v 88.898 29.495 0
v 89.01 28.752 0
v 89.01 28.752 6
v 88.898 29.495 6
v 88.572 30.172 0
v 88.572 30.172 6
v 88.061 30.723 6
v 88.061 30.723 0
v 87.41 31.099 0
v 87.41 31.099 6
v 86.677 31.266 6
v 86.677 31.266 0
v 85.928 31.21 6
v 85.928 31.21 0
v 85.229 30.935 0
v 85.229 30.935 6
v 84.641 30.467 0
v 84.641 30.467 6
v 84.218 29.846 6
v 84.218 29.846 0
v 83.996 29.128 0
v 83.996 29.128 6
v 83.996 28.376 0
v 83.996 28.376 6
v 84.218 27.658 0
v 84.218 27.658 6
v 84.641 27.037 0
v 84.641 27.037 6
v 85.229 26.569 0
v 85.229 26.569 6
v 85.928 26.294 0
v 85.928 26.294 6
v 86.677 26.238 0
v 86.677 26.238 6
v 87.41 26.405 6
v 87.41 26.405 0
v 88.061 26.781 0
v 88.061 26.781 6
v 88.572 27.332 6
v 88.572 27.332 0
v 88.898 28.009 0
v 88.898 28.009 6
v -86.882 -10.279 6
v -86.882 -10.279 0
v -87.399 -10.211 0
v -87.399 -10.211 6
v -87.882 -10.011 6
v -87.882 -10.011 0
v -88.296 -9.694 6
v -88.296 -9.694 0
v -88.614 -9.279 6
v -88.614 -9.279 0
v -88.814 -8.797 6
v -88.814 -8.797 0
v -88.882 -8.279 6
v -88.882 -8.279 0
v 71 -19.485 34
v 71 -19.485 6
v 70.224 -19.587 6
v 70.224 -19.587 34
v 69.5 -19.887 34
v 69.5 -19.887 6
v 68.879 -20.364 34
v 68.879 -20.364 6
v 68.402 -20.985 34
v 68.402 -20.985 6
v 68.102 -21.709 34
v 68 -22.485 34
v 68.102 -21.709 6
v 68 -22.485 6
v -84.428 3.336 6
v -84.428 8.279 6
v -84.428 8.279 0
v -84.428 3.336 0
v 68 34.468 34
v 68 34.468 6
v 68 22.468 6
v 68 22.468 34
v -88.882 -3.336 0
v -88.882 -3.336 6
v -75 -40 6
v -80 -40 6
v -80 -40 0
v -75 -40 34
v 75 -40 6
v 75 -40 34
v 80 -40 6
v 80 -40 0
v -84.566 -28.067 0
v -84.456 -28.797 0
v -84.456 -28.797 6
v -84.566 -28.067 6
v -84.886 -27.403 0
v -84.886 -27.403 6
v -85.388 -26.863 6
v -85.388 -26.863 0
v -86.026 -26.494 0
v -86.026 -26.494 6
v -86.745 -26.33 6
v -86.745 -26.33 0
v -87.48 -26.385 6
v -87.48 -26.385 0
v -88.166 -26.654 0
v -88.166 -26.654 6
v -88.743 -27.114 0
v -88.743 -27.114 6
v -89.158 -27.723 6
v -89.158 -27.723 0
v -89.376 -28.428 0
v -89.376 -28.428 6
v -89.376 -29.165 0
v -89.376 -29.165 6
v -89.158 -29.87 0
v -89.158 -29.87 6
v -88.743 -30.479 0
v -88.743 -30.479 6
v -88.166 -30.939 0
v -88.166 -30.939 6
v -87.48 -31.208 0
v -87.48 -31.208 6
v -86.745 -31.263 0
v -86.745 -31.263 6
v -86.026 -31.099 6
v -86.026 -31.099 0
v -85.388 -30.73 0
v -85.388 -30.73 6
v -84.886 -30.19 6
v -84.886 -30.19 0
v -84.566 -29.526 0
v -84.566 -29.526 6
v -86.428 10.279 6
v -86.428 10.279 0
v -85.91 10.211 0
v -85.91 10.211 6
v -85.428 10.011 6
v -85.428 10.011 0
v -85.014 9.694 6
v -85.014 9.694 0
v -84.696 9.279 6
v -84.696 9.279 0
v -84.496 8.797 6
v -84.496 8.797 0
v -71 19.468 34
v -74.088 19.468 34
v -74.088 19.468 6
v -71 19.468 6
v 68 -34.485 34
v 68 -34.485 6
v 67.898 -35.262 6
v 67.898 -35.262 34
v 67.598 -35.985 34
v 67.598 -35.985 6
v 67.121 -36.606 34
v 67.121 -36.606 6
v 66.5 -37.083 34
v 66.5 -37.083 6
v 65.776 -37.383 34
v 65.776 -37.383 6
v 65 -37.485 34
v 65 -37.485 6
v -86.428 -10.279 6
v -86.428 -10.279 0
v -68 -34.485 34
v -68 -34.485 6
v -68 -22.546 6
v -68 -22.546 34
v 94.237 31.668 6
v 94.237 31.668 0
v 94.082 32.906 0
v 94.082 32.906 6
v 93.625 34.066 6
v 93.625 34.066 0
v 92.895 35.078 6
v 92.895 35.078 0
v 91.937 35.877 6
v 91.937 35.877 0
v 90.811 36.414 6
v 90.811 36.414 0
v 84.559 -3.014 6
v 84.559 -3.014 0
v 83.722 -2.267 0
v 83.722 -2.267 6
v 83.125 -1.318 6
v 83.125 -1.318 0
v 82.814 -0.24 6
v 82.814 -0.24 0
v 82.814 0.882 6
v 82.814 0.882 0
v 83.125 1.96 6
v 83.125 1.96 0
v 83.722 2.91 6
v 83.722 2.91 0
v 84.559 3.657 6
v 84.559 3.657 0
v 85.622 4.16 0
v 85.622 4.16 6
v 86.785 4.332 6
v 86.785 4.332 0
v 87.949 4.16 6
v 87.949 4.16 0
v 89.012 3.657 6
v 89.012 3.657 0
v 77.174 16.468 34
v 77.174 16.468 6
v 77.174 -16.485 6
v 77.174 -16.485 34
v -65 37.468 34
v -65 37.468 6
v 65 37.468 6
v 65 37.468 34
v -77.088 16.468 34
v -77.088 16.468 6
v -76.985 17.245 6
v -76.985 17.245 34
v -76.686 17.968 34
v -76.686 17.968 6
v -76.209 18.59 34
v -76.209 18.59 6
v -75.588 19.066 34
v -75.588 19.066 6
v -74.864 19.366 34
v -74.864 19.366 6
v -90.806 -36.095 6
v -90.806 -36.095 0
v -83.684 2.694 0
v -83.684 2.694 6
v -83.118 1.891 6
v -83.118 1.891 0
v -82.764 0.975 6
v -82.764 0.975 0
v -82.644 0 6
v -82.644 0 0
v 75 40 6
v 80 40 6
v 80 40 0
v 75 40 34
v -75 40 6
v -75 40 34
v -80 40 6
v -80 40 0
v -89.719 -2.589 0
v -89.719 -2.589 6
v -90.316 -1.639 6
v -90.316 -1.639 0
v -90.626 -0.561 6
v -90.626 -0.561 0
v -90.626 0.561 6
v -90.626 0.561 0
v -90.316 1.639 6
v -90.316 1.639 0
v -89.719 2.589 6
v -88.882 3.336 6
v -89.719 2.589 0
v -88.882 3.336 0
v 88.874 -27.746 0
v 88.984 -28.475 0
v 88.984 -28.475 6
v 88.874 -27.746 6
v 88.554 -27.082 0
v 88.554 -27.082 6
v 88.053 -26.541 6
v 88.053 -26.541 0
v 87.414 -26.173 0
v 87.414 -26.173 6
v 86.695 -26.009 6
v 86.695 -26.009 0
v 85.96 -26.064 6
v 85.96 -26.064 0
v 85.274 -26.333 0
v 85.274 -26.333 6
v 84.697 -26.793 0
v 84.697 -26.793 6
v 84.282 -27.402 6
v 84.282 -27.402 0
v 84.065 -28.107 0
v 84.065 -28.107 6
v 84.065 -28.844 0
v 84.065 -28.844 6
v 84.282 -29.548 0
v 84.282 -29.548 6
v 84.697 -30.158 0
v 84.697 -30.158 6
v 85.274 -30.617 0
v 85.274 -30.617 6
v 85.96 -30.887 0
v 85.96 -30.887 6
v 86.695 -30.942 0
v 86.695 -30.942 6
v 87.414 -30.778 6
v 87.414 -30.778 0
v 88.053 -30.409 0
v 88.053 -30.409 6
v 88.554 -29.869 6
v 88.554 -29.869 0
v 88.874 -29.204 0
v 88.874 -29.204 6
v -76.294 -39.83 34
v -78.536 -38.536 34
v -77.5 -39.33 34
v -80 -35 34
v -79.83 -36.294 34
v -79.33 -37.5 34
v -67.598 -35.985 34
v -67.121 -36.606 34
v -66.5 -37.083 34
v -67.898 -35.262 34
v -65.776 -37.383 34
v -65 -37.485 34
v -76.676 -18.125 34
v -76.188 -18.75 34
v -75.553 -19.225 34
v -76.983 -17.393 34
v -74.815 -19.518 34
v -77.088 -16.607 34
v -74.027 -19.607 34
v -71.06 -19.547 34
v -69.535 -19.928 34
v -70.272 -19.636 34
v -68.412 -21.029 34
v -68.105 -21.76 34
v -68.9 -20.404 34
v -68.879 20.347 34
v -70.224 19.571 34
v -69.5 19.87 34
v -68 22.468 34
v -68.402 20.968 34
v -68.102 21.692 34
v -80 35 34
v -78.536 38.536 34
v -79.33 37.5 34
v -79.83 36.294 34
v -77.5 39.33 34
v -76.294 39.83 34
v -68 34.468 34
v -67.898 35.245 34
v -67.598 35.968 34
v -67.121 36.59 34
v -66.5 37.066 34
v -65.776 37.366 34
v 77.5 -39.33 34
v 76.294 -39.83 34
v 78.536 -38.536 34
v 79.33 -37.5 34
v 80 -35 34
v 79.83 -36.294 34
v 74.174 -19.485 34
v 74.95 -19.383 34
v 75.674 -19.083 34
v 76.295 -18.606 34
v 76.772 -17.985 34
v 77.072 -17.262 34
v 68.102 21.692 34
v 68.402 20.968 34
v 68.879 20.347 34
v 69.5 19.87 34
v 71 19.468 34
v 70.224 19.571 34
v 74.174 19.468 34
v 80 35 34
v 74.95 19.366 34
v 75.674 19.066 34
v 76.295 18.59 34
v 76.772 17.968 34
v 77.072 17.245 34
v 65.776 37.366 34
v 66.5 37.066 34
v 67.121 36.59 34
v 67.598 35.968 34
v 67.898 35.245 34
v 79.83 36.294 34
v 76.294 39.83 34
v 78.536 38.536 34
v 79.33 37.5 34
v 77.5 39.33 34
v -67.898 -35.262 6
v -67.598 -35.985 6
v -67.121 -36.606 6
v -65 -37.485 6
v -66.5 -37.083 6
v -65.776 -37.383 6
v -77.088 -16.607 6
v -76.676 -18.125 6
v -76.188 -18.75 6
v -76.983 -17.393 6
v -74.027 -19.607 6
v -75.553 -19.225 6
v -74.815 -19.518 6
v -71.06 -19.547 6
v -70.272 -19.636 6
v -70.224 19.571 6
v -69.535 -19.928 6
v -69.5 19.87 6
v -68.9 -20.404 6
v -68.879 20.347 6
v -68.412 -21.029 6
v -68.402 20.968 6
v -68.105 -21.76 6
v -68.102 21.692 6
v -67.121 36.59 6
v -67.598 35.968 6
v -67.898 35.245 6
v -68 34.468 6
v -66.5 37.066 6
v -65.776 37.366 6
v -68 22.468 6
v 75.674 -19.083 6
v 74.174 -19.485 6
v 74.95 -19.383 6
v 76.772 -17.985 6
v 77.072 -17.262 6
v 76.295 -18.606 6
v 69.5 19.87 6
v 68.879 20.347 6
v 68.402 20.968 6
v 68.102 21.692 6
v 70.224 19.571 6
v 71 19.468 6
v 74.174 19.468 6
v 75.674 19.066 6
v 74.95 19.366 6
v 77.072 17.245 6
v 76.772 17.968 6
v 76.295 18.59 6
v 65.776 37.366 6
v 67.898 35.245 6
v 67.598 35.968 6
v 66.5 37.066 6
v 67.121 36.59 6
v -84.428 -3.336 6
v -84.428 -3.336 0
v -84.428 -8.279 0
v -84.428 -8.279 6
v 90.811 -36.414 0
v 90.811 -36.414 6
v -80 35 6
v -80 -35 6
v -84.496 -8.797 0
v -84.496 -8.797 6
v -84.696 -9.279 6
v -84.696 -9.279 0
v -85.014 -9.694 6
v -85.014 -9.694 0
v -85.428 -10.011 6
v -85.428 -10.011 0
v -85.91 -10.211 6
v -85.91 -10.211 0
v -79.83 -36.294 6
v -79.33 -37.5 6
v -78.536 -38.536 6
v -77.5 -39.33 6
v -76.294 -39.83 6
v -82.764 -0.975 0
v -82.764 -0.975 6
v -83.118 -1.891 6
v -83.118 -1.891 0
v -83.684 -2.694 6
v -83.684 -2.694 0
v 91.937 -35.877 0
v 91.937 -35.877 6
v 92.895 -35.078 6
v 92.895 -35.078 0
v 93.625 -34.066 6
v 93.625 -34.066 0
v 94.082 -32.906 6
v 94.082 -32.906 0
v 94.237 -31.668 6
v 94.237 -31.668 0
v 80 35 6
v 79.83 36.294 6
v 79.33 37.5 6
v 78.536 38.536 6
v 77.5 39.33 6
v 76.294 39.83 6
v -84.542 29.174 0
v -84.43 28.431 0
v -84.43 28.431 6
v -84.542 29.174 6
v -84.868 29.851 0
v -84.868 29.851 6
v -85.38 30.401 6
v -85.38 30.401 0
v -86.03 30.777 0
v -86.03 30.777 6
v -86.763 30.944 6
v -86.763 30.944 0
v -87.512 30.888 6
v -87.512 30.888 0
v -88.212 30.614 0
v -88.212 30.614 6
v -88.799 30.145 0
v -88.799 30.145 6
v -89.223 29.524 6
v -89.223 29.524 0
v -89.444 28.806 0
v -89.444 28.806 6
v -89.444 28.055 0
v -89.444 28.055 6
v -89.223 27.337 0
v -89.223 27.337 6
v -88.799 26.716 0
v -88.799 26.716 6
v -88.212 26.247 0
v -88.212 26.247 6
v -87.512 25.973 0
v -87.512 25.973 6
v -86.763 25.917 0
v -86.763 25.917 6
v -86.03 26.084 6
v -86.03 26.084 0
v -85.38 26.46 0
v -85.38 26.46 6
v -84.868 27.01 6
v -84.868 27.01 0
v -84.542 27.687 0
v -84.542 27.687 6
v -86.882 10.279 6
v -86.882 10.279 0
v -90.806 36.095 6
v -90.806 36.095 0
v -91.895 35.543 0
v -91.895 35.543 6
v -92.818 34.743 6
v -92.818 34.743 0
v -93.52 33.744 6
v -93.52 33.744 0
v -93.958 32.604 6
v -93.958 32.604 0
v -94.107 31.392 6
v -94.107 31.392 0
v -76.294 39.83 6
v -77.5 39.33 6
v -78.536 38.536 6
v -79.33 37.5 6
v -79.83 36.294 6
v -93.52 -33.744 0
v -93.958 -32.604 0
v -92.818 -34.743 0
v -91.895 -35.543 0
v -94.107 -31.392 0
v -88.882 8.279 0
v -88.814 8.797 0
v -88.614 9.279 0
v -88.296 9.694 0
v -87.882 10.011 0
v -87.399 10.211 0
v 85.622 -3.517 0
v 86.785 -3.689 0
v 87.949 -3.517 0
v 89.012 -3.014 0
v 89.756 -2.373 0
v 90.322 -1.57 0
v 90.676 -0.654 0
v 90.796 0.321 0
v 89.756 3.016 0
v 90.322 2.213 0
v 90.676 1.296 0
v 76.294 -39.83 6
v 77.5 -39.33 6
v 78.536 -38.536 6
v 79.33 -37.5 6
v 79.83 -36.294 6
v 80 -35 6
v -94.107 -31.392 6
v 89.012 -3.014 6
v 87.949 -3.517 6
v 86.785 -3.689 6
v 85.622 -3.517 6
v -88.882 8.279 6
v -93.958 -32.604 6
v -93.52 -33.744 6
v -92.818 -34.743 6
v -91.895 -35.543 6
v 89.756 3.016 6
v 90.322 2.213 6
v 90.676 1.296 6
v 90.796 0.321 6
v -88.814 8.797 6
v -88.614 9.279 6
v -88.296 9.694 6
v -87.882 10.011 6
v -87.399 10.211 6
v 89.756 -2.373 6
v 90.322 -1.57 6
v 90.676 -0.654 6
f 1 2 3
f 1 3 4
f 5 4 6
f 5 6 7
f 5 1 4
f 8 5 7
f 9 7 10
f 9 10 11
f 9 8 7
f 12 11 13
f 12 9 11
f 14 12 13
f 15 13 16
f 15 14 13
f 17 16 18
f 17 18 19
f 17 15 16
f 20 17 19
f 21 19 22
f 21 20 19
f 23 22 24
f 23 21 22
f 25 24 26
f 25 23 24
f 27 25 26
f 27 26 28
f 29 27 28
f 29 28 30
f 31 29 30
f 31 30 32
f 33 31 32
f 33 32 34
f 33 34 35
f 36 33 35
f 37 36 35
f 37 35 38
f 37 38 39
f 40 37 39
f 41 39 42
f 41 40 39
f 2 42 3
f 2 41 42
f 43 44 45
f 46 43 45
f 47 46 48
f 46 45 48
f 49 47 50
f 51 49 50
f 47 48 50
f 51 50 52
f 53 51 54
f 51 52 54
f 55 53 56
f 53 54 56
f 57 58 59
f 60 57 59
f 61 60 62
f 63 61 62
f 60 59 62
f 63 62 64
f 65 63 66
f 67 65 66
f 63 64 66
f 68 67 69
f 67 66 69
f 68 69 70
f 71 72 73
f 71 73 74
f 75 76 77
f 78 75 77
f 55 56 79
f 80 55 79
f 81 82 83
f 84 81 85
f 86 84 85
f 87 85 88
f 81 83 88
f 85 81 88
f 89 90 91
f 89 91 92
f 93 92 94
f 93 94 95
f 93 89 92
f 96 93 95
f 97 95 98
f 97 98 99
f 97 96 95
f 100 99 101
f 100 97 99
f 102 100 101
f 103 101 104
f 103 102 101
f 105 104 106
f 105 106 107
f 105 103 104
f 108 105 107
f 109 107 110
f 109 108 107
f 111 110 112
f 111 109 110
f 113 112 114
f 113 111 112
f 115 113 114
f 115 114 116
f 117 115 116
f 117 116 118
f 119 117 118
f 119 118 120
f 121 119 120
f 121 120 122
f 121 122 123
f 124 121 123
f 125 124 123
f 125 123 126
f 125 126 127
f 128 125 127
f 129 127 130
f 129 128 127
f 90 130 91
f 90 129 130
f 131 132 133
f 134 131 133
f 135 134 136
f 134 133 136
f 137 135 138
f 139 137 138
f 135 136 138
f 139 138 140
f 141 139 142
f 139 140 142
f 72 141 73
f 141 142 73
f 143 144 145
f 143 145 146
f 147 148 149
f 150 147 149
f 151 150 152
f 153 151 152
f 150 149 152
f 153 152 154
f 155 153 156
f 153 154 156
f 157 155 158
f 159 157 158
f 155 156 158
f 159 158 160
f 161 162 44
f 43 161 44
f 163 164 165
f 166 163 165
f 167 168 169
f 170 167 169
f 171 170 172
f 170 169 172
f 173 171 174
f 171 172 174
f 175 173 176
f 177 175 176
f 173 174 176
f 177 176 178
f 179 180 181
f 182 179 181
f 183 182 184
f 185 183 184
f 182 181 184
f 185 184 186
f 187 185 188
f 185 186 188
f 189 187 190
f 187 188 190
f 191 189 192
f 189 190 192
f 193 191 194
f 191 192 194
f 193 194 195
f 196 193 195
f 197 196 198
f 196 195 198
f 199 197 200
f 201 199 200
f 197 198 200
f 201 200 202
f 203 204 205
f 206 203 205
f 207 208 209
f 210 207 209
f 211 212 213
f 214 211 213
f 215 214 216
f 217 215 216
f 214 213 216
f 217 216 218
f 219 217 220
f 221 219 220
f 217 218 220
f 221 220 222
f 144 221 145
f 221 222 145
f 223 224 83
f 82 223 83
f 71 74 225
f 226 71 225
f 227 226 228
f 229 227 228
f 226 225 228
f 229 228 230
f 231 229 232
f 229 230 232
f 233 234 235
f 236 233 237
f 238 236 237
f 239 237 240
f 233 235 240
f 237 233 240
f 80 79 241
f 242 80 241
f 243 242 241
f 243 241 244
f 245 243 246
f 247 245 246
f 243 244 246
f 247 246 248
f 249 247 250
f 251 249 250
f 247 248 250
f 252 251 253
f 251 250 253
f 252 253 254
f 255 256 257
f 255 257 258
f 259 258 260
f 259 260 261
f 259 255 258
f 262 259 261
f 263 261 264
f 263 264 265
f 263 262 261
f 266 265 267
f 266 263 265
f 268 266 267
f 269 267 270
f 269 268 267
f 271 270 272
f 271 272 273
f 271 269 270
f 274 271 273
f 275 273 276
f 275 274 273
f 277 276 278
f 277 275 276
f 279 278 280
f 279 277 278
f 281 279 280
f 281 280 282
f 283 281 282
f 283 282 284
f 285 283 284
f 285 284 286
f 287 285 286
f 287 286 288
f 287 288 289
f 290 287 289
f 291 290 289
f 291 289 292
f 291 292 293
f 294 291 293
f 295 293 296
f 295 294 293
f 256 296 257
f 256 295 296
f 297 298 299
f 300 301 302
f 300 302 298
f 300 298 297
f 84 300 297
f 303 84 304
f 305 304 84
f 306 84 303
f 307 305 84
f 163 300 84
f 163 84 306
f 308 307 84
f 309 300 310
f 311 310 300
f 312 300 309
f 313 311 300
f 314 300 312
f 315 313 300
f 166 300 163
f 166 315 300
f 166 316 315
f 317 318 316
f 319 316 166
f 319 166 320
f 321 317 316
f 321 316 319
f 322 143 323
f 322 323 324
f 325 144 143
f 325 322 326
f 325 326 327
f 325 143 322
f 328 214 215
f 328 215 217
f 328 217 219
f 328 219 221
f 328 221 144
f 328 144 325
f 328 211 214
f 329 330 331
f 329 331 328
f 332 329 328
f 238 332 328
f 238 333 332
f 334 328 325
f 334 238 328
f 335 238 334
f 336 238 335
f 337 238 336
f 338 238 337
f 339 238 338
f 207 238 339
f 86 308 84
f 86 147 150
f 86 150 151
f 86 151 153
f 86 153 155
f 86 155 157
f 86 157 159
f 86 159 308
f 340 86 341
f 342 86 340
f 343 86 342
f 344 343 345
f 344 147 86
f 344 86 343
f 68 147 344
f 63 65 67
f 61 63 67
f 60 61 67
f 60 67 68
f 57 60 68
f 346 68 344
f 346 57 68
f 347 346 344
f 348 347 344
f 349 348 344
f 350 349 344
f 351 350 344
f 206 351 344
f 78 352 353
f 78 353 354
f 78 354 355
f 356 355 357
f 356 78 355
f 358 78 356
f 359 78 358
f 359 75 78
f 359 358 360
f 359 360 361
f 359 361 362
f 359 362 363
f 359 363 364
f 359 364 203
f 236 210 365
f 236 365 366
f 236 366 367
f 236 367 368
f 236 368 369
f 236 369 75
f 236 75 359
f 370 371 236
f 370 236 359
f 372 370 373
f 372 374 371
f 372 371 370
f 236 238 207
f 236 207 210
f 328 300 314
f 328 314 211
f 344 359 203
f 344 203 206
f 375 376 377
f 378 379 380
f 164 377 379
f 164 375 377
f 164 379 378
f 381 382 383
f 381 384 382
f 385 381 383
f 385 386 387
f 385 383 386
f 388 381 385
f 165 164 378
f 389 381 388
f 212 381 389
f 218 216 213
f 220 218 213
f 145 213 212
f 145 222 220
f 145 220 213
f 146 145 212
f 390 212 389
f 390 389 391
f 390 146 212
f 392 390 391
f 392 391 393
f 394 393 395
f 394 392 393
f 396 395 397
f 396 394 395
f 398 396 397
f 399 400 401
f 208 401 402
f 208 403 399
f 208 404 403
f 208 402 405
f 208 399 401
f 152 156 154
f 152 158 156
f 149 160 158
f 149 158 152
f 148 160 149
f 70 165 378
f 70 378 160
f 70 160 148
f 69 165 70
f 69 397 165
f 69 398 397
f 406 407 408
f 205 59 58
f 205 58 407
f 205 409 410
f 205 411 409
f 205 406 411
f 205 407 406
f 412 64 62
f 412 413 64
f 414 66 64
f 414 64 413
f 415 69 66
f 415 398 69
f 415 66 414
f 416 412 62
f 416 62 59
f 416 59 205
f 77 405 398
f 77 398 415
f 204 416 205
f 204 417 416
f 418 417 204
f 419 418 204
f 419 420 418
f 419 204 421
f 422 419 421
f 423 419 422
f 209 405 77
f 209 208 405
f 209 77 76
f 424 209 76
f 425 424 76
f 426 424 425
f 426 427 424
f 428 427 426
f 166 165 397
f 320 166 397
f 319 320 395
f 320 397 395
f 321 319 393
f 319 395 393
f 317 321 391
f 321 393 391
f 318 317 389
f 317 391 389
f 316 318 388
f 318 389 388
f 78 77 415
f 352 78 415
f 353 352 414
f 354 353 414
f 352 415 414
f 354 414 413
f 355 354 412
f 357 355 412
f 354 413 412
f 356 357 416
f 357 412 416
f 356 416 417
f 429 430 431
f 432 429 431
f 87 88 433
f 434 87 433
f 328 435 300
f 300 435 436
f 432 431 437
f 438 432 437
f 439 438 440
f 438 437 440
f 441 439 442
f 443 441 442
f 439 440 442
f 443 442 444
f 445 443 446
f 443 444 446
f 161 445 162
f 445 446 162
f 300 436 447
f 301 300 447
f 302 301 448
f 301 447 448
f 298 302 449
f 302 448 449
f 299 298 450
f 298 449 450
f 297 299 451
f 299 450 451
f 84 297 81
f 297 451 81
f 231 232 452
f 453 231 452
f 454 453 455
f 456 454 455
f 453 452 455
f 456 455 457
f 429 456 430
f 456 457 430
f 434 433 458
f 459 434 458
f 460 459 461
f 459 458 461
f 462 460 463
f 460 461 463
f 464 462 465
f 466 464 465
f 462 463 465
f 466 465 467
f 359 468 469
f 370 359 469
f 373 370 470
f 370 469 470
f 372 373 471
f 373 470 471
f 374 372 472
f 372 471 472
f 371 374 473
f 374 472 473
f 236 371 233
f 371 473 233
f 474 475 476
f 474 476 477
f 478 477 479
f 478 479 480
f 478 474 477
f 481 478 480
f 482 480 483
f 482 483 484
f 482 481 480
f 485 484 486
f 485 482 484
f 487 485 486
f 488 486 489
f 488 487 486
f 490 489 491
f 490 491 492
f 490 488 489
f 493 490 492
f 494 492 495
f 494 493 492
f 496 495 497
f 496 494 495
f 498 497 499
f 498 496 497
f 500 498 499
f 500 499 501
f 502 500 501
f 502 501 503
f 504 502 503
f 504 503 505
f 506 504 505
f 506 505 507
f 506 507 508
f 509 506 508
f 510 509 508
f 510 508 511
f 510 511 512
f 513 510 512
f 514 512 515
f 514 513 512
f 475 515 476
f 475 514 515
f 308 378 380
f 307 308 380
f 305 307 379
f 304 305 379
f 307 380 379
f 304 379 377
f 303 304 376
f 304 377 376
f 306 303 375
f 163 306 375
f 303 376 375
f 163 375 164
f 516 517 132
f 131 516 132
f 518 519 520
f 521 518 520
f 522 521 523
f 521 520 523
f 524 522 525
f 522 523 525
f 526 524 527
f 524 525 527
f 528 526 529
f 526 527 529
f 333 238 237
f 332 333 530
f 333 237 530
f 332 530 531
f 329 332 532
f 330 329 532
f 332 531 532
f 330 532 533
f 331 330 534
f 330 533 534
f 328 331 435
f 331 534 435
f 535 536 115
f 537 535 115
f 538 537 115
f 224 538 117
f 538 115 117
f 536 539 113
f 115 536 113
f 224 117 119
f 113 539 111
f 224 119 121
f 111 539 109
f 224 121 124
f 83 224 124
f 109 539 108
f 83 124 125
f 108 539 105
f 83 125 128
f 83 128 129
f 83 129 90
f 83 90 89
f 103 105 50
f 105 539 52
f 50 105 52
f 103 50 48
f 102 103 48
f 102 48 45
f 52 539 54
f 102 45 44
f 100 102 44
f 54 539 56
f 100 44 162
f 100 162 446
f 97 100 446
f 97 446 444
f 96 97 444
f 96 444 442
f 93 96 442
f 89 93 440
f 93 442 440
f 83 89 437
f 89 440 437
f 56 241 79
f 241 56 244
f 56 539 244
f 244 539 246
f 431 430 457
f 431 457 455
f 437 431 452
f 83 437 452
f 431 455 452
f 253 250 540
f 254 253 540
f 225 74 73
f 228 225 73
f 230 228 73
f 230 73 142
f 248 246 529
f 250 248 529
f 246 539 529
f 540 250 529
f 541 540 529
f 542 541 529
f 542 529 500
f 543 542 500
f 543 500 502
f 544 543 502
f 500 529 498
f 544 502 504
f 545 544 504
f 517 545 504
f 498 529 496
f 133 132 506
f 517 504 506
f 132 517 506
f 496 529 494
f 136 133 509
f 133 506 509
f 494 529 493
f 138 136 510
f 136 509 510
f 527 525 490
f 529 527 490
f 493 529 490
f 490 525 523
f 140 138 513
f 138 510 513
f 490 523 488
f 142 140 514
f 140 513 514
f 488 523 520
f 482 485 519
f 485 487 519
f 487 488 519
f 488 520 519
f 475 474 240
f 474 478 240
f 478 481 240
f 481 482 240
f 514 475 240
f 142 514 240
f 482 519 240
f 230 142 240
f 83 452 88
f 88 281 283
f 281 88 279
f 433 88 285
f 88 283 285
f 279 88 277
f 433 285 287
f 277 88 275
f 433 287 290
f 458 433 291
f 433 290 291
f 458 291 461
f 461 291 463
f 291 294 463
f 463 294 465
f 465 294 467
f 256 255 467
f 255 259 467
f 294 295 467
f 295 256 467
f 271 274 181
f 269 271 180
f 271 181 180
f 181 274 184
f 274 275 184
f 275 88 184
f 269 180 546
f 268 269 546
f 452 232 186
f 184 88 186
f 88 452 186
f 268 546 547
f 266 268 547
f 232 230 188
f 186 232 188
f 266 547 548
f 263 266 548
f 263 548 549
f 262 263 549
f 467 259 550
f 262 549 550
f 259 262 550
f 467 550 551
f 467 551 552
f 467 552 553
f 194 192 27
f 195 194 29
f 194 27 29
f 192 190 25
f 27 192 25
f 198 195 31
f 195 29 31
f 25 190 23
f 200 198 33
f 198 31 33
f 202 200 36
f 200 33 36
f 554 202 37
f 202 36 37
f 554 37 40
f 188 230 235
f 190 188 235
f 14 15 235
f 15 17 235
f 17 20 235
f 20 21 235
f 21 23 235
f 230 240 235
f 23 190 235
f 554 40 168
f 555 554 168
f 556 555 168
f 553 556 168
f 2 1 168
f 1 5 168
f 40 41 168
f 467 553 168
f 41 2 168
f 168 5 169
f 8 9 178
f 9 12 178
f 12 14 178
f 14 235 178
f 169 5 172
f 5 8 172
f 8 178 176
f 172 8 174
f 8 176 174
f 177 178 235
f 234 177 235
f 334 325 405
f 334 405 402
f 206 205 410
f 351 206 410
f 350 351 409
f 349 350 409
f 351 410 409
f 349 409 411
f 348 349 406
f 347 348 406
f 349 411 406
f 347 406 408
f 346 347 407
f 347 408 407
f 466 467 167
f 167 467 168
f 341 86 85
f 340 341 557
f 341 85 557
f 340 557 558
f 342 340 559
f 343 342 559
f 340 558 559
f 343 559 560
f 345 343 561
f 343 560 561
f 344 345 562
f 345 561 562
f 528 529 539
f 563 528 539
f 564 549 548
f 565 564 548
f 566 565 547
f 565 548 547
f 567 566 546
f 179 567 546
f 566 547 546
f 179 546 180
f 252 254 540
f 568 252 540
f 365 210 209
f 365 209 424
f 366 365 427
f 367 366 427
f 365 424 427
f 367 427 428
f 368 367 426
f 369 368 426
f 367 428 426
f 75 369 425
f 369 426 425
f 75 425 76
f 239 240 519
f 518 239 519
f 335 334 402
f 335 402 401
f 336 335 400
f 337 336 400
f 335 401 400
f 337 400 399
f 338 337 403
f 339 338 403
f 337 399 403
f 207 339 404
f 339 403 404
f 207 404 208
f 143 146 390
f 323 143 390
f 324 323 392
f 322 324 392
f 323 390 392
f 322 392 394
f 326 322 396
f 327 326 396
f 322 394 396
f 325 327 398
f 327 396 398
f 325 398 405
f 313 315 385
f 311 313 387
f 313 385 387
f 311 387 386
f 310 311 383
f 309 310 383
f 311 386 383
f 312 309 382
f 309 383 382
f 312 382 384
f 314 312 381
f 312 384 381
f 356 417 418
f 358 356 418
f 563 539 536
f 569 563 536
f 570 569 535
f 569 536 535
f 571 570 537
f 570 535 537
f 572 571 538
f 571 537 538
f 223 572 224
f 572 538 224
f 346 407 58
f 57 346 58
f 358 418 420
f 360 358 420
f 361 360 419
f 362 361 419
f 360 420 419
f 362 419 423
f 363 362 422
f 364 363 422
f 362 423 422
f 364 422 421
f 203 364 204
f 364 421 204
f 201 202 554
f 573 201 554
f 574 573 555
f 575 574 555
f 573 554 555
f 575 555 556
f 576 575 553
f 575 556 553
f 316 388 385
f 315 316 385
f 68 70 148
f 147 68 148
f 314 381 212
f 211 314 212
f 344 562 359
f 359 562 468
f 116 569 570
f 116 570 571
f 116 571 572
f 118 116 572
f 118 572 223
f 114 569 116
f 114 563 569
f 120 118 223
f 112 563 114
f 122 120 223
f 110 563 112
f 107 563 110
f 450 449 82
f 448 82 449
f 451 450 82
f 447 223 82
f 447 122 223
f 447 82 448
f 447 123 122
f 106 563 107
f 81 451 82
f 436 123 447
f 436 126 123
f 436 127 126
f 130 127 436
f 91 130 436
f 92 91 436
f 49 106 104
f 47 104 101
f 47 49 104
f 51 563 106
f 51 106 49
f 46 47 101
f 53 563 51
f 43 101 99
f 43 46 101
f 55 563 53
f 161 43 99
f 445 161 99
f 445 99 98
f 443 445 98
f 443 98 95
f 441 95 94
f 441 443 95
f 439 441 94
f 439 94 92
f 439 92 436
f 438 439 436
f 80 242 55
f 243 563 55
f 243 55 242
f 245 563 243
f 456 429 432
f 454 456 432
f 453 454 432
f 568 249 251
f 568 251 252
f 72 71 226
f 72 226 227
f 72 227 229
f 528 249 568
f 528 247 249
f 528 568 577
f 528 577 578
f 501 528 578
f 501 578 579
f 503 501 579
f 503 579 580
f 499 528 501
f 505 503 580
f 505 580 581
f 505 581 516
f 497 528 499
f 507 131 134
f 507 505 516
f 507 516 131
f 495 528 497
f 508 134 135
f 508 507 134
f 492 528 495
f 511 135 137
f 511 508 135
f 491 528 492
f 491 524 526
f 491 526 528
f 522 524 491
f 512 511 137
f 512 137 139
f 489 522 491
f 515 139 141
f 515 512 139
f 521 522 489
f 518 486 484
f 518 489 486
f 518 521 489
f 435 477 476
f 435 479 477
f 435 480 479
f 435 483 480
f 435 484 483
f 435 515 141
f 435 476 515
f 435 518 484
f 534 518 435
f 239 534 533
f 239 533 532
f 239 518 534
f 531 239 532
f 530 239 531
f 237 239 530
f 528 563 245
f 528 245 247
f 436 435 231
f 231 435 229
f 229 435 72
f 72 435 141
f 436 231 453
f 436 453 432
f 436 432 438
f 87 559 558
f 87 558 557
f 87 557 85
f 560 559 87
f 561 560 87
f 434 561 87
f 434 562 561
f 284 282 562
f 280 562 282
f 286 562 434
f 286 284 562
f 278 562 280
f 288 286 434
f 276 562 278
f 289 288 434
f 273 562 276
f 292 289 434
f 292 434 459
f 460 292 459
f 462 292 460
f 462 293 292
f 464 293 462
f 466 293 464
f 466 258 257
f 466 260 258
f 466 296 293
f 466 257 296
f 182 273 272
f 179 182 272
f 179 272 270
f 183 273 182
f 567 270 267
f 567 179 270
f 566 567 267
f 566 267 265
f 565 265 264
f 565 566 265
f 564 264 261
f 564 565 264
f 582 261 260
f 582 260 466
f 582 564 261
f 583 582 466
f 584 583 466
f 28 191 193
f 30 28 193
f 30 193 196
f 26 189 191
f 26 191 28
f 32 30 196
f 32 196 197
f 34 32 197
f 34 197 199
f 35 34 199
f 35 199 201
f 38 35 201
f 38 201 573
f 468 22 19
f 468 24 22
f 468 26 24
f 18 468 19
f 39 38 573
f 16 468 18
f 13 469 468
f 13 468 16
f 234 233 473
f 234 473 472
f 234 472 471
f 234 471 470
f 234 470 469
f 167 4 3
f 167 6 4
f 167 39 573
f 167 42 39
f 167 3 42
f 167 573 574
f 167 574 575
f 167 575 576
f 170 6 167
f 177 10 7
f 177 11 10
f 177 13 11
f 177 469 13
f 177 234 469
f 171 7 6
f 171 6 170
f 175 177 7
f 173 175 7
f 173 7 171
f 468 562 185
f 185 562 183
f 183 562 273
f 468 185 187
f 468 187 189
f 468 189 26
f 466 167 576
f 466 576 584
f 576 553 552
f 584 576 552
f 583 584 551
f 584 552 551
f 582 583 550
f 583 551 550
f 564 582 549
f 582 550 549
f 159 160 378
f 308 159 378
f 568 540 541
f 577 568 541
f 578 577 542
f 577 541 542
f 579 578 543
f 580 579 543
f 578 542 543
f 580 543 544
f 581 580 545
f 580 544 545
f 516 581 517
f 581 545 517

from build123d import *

# Parameters (mm, degrees)
F0_R     = 2.4734326525
F0_R_2   = 2.5209595833
F1_DEPTH = 6
F2_DEPTH = 34
F3_DEPTH = 6


with BuildPart() as f1:
    # F0 (on Top) → F1 (new body)
    with BuildSketch(Plane.XY):
        with BuildLine():
            ThreePointArc((80, 35), (78.5355339059, 38.5355339059), (75, 40))
            Line((75, 40), (-75, 40))
            ThreePointArc((-75, 40), (-78.5355339059, 38.5355339059), (-80, 35))
            Line((-80, 35), (-80, -35))
            ThreePointArc((-80, -35), (-78.5355339059, -38.5355339059), (-75, -40))
            Line((-75, -40), (75, -40))
            ThreePointArc((75, -40), (78.5355339059, -38.5355339059), (80, -35))
            Line((80, -35), (80, 35))
        make_face()
        with BuildLine():
            ThreePointArc((-68, 34.4683335721), (-67.1213203436, 36.5896539157), (-65, 37.4683335721))
            Line((-65, 37.4683335721), (0, 37.4683335721))
            Line((0, 37.4683335721), (65, 37.4683335721))
            ThreePointArc((65, 37.4683335721), (67.1213203436, 36.5896539157), (68, 34.4683335721))
            Line((68, 34.4683335721), (68, 22.4683335721))
            ThreePointArc((68, 22.4683335721), (68.8786796564, 20.3470132286), (71, 19.4683335721))
            Line((71, 19.4683335721), (74.1739631891, 19.4683335721))
            ThreePointArc((74.1739631891, 19.4683335721), (76.2952835327, 18.5896539157), (77.1739631891, 16.4683335721))
            Line((77.1739631891, 16.4683335721), (77.1739631891, -16.4851338565))
            ThreePointArc((77.1739631891, -16.4851338565), (76.2952835327, -18.6064542001), (74.1739631891, -19.4851338565))
            Line((74.1739631891, -19.4851338565), (71, -19.4851338565))
            ThreePointArc((71, -19.4851338565), (68.8786796564, -20.363813513), (68, -22.4851338565))
            Line((68, -22.4851338565), (68, -34.4851338565))
            ThreePointArc((68, -34.4851338565), (67.1213203436, -36.6064542001), (65, -37.4851338565))
            Line((65, -37.4851338565), (0, -37.4851338565))
            Line((0, -37.4851338565), (-65, -37.4851338565))
            ThreePointArc((-65, -37.4851338565), (-67.1213203436, -36.6064542001), (-68, -34.4851338565))
            Line((-68, -34.4851338565), (-68, -22.5461551776))
            ThreePointArc((-68, -22.5461551776), (-68.9001431644, -20.4035863292), (-71.0604008466, -19.5467632829))
            Line((-71.0604008466, -19.5467632829), (-74.0273144216, -19.6065100909))
            ThreePointArc((-74.0273144216, -19.6065100909), (-76.1875721038, -18.7496870446), (-77.0877152681, -16.6071181963))
            Line((-77.0877152681, -16.6071181963), (-77.0877152681, 16.4683335721))
            ThreePointArc((-77.0877152681, 16.4683335721), (-76.2090356117, 18.5896539157), (-74.0877152681, 19.4683335721))
            Line((-74.0877152681, 19.4683335721), (-71, 19.4683335721))
            ThreePointArc((-71, 19.4683335721), (-68.8786796564, 20.3470132286), (-68, 22.4683335721))
            Line((-68, 22.4683335721), (-68, 34.4683335721))
        make_face(mode=Mode.SUBTRACT)
        with BuildLine():
            Line((80, 40), (75, 40))
            ThreePointArc((75, 40), (78.5355339059, 38.5355339059), (80, 35))
            Line((80, 35), (80, -35))
            ThreePointArc((80, -35), (78.5355339059, -38.5355339059), (75, -40))
            Line((75, -40), (80, -40))
            Line((80, -40), (90.8113707836, -36.4140822894))
            ThreePointArc((90.8113707836, -36.4140822894), (93.2913283913, -34.5948870007), (94.2372945148, -31.6683174512))
            Line((94.2372945148, -31.6683174512), (94.2372945148, 31.6683174512))
            ThreePointArc((94.2372945148, 31.6683174512), (93.2913283913, 34.5948870007), (90.8113707836, 36.4140822894))
            Line((90.8113707836, 36.4140822894), (80, 40))
        make_face()
        with Locations((86.5106463432, -28.475206584)):
            Circle(F0_R, mode=Mode.SUBTRACT)
        with BuildLine():
            ThreePointArc((90.7961837325, 0.3213284013), (90.3221869675, -1.5701075157), (89.0122309327, -3.0144821029))
            ThreePointArc((89.0122309327, -3.0144821029), (86.7853939533, -3.6894613779), (84.5585569739, -3.0144821029))
            ThreePointArc((84.5585569739, -3.0144821029), (82.7746041741, 0.3213284013), (84.5585569739, 3.6571389056))
            ThreePointArc((84.5585569739, 3.6571389056), (86.7853939533, 4.3321181805), (89.0122309327, 3.6571389056))
            ThreePointArc((89.0122309327, 3.6571389056), (90.3221869675, 2.2127643183), (90.7961837325, 0.3213284013))
        make_face(mode=Mode.SUBTRACT)
        with Locations((86.4890247583, 28.7518498895)):
            Circle(F0_R_2, mode=Mode.SUBTRACT)
        with BuildLine():
            ThreePointArc((-80, 35), (-78.5355339059, 38.5355339059), (-75, 40))
            Line((-75, 40), (-80, 40))
            Line((-80, 40), (-90.8064321274, 36.0946163646))
            ThreePointArc((-90.8064321274, 36.0946163646), (-93.1995248699, 34.2648146936), (-94.1070315729, 31.392272507))
            Line((-94.1070315729, 31.392272507), (-94.1070315729, -31.392272507))
            ThreePointArc((-94.1070315729, -31.392272507), (-93.1995248699, -34.2648146936), (-90.8064321274, -36.0946163646))
            Line((-90.8064321274, -36.0946163646), (-80, -40))
            Line((-80, -40), (-75, -40))
            ThreePointArc((-75, -40), (-78.5355339059, -38.5355339059), (-80, -35))
            Line((-80, -35), (-80, 35))
        make_face()
        with Locations((-86.9296938181, -28.7965349853)):
            Circle(F0_R, mode=Mode.SUBTRACT)
        with BuildLine():
            ThreePointArc((-84.4281092286, -8.2794375271), (-85.0138956662, -9.6936510894), (-86.4281092286, -10.2794375271))
            Line((-86.4281092286, -10.2794375271), (-86.8817831874, -10.2794375271))
            ThreePointArc((-86.8817831874, -10.2794375271), (-88.2959967498, -9.6936510894), (-88.8817831874, -8.2794375271))
            Line((-88.8817831874, -8.2794375271), (-88.8817831874, -3.3358105042))
            ThreePointArc((-88.8817831874, -3.3358105042), (-90.6657359872, 0), (-88.8817831874, 3.3358105042))
            Line((-88.8817831874, 3.3358105042), (-88.8817831874, 8.2794375271))
            ThreePointArc((-88.8817831874, 8.2794375271), (-88.2959967498, 9.6936510894), (-86.8817831874, 10.2794375271))
            Line((-86.8817831874, 10.2794375271), (-86.4281092286, 10.2794375271))
            ThreePointArc((-86.4281092286, 10.2794375271), (-85.0138956662, 9.6936510894), (-84.4281092286, 8.2794375271))
            Line((-84.4281092286, 8.2794375271), (-84.4281092286, 3.3358105042))
            ThreePointArc((-84.4281092286, 3.3358105042), (-83.1181531938, 1.891435917), (-82.6441564288, 0))
            ThreePointArc((-82.6441564288, 0), (-83.1181531938, -1.891435917), (-84.4281092286, -3.3358105042))
            Line((-84.4281092286, -3.3358105042), (-84.4281092286, -8.2794375271))
        make_face(mode=Mode.SUBTRACT)
        with Locations((-86.951315403, 28.4305214882)):
            Circle(F0_R_2, mode=Mode.SUBTRACT)
    extrude(amount=F1_DEPTH)

    # F0 (on Top) → F2 (join)
    with BuildSketch(Plane.XY):
        with BuildLine():
            ThreePointArc((80, 35), (78.5355339059, 38.5355339059), (75, 40))
            Line((75, 40), (-75, 40))
            ThreePointArc((-75, 40), (-78.5355339059, 38.5355339059), (-80, 35))
            Line((-80, 35), (-80, -35))
            ThreePointArc((-80, -35), (-78.5355339059, -38.5355339059), (-75, -40))
            Line((-75, -40), (75, -40))
            ThreePointArc((75, -40), (78.5355339059, -38.5355339059), (80, -35))
            Line((80, -35), (80, 35))
        make_face()
        with BuildLine():
            ThreePointArc((-68, 34.4683335721), (-67.1213203436, 36.5896539157), (-65, 37.4683335721))
            Line((-65, 37.4683335721), (0, 37.4683335721))
            Line((0, 37.4683335721), (65, 37.4683335721))
            ThreePointArc((65, 37.4683335721), (67.1213203436, 36.5896539157), (68, 34.4683335721))
            Line((68, 34.4683335721), (68, 22.4683335721))
            ThreePointArc((68, 22.4683335721), (68.8786796564, 20.3470132286), (71, 19.4683335721))
            Line((71, 19.4683335721), (74.1739631891, 19.4683335721))
            ThreePointArc((74.1739631891, 19.4683335721), (76.2952835327, 18.5896539157), (77.1739631891, 16.4683335721))
            Line((77.1739631891, 16.4683335721), (77.1739631891, -16.4851338565))
            ThreePointArc((77.1739631891, -16.4851338565), (76.2952835327, -18.6064542001), (74.1739631891, -19.4851338565))
            Line((74.1739631891, -19.4851338565), (71, -19.4851338565))
            ThreePointArc((71, -19.4851338565), (68.8786796564, -20.363813513), (68, -22.4851338565))
            Line((68, -22.4851338565), (68, -34.4851338565))
            ThreePointArc((68, -34.4851338565), (67.1213203436, -36.6064542001), (65, -37.4851338565))
            Line((65, -37.4851338565), (0, -37.4851338565))
            Line((0, -37.4851338565), (-65, -37.4851338565))
            ThreePointArc((-65, -37.4851338565), (-67.1213203436, -36.6064542001), (-68, -34.4851338565))
            Line((-68, -34.4851338565), (-68, -22.5461551776))
            ThreePointArc((-68, -22.5461551776), (-68.9001431644, -20.4035863292), (-71.0604008466, -19.5467632829))
            Line((-71.0604008466, -19.5467632829), (-74.0273144216, -19.6065100909))
            ThreePointArc((-74.0273144216, -19.6065100909), (-76.1875721038, -18.7496870446), (-77.0877152681, -16.6071181963))
            Line((-77.0877152681, -16.6071181963), (-77.0877152681, 16.4683335721))
            ThreePointArc((-77.0877152681, 16.4683335721), (-76.2090356117, 18.5896539157), (-74.0877152681, 19.4683335721))
            Line((-74.0877152681, 19.4683335721), (-71, 19.4683335721))
            ThreePointArc((-71, 19.4683335721), (-68.8786796564, 20.3470132286), (-68, 22.4683335721))
            Line((-68, 22.4683335721), (-68, 34.4683335721))
        make_face(mode=Mode.SUBTRACT)
    extrude(amount=F2_DEPTH)

    # F0 (on Top) → F3 (join)
    with BuildSketch(Plane.XY):
        with BuildLine():
            ThreePointArc((80, 35), (78.5355339059, 38.5355339059), (75, 40))
            Line((75, 40), (-75, 40))
            ThreePointArc((-75, 40), (-78.5355339059, 38.5355339059), (-80, 35))
            Line((-80, 35), (-80, -35))
            ThreePointArc((-80, -35), (-78.5355339059, -38.5355339059), (-75, -40))
            Line((-75, -40), (75, -40))
            ThreePointArc((75, -40), (78.5355339059, -38.5355339059), (80, -35))
            Line((80, -35), (80, 35))
        make_face()
        with BuildLine():
            ThreePointArc((-68, 34.4683335721), (-67.1213203436, 36.5896539157), (-65, 37.4683335721))
            Line((-65, 37.4683335721), (0, 37.4683335721))
            Line((0, 37.4683335721), (65, 37.4683335721))
            ThreePointArc((65, 37.4683335721), (67.1213203436, 36.5896539157), (68, 34.4683335721))
            Line((68, 34.4683335721), (68, 22.4683335721))
            ThreePointArc((68, 22.4683335721), (68.8786796564, 20.3470132286), (71, 19.4683335721))
            Line((71, 19.4683335721), (74.1739631891, 19.4683335721))
            ThreePointArc((74.1739631891, 19.4683335721), (76.2952835327, 18.5896539157), (77.1739631891, 16.4683335721))
            Line((77.1739631891, 16.4683335721), (77.1739631891, -16.4851338565))
            ThreePointArc((77.1739631891, -16.4851338565), (76.2952835327, -18.6064542001), (74.1739631891, -19.4851338565))
            Line((74.1739631891, -19.4851338565), (71, -19.4851338565))
            ThreePointArc((71, -19.4851338565), (68.8786796564, -20.363813513), (68, -22.4851338565))
            Line((68, -22.4851338565), (68, -34.4851338565))
            ThreePointArc((68, -34.4851338565), (67.1213203436, -36.6064542001), (65, -37.4851338565))
            Line((65, -37.4851338565), (0, -37.4851338565))
            Line((0, -37.4851338565), (-65, -37.4851338565))
            ThreePointArc((-65, -37.4851338565), (-67.1213203436, -36.6064542001), (-68, -34.4851338565))
            Line((-68, -34.4851338565), (-68, -22.5461551776))
            ThreePointArc((-68, -22.5461551776), (-68.9001431644, -20.4035863292), (-71.0604008466, -19.5467632829))
            Line((-71.0604008466, -19.5467632829), (-74.0273144216, -19.6065100909))
            ThreePointArc((-74.0273144216, -19.6065100909), (-76.1875721038, -18.7496870446), (-77.0877152681, -16.6071181963))
            Line((-77.0877152681, -16.6071181963), (-77.0877152681, 16.4683335721))
            ThreePointArc((-77.0877152681, 16.4683335721), (-76.2090356117, 18.5896539157), (-74.0877152681, 19.4683335721))
            Line((-74.0877152681, 19.4683335721), (-71, 19.4683335721))
            ThreePointArc((-71, 19.4683335721), (-68.8786796564, 20.3470132286), (-68, 22.4683335721))
            Line((-68, 22.4683335721), (-68, 34.4683335721))
        make_face(mode=Mode.SUBTRACT)
        with BuildLine():
            Line((0, 37.4683335721), (-65, 37.4683335721))
            ThreePointArc((-65, 37.4683335721), (-67.1213203436, 36.5896539157), (-68, 34.4683335721))
            Line((-68, 34.4683335721), (-68, 22.4683335721))
            ThreePointArc((-68, 22.4683335721), (-68.8786796564, 20.3470132286), (-71, 19.4683335721))
            Line((-71, 19.4683335721), (-74.0877152681, 19.4683335721))
            ThreePointArc((-74.0877152681, 19.4683335721), (-76.2090356117, 18.5896539157), (-77.0877152681, 16.4683335721))
            Line((-77.0877152681, 16.4683335721), (-77.0877152681, -16.6071181963))
            ThreePointArc((-77.0877152681, -16.6071181963), (-76.1875721038, -18.7496870446), (-74.0273144216, -19.6065100909))
            Line((-74.0273144216, -19.6065100909), (-71.0604008466, -19.5467632829))
            ThreePointArc((-71.0604008466, -19.5467632829), (-68.9001431644, -20.4035863292), (-68, -22.5461551776))
            Line((-68, -22.5461551776), (-68, -34.4851338565))
            ThreePointArc((-68, -34.4851338565), (-67.1213203436, -36.6064542001), (-65, -37.4851338565))
            Line((-65, -37.4851338565), (0, -37.4851338565))
            Line((0, -37.4851338565), (65, -37.4851338565))
            ThreePointArc((65, -37.4851338565), (67.1213203436, -36.6064542001), (68, -34.4851338565))
            Line((68, -34.4851338565), (68, -22.4851338565))
            ThreePointArc((68, -22.4851338565), (68.8786796564, -20.363813513), (71, -19.4851338565))
            Line((71, -19.4851338565), (74.1739631891, -19.4851338565))
            ThreePointArc((74.1739631891, -19.4851338565), (76.2952835327, -18.6064542001), (77.1739631891, -16.4851338565))
            Line((77.1739631891, -16.4851338565), (77.1739631891, 16.4683335721))
            ThreePointArc((77.1739631891, 16.4683335721), (76.2952835327, 18.5896539157), (74.1739631891, 19.4683335721))
            Line((74.1739631891, 19.4683335721), (71, 19.4683335721))
            ThreePointArc((71, 19.4683335721), (68.8786796564, 20.3470132286), (68, 22.4683335721))
            Line((68, 22.4683335721), (68, 34.4683335721))
            ThreePointArc((68, 34.4683335721), (67.1213203436, 36.5896539157), (65, 37.4683335721))
            Line((65, 37.4683335721), (0, 37.4683335721))
        make_face()
        with BuildLine():
            Line((80, 40), (75, 40))
            ThreePointArc((75, 40), (78.5355339059, 38.5355339059), (80, 35))
            Line((80, 35), (80, -35))
            ThreePointArc((80, -35), (78.5355339059, -38.5355339059), (75, -40))
            Line((75, -40), (80, -40))
            Line((80, -40), (90.8113707836, -36.4140822894))
            ThreePointArc((90.8113707836, -36.4140822894), (93.2913283913, -34.5948870007), (94.2372945148, -31.6683174512))
            Line((94.2372945148, -31.6683174512), (94.2372945148, 31.6683174512))
            ThreePointArc((94.2372945148, 31.6683174512), (93.2913283913, 34.5948870007), (90.8113707836, 36.4140822894))
            Line((90.8113707836, 36.4140822894), (80, 40))
        make_face()
        with Locations((86.5106463432, -28.475206584)):
            Circle(F0_R, mode=Mode.SUBTRACT)
        with BuildLine():
            ThreePointArc((90.7961837325, 0.3213284013), (90.3221869675, -1.5701075157), (89.0122309327, -3.0144821029))
            ThreePointArc((89.0122309327, -3.0144821029), (86.7853939533, -3.6894613779), (84.5585569739, -3.0144821029))
            ThreePointArc((84.5585569739, -3.0144821029), (82.7746041741, 0.3213284013), (84.5585569739, 3.6571389056))
            ThreePointArc((84.5585569739, 3.6571389056), (86.7853939533, 4.3321181805), (89.0122309327, 3.6571389056))
            ThreePointArc((89.0122309327, 3.6571389056), (90.3221869675, 2.2127643183), (90.7961837325, 0.3213284013))
        make_face(mode=Mode.SUBTRACT)
        with Locations((86.4890247583, 28.7518498895)):
            Circle(F0_R_2, mode=Mode.SUBTRACT)
        with BuildLine():
            ThreePointArc((-80, 35), (-78.5355339059, 38.5355339059), (-75, 40))
            Line((-75, 40), (-80, 40))
            Line((-80, 40), (-90.8064321274, 36.0946163646))
            ThreePointArc((-90.8064321274, 36.0946163646), (-93.1995248699, 34.2648146936), (-94.1070315729, 31.392272507))
            Line((-94.1070315729, 31.392272507), (-94.1070315729, -31.392272507))
            ThreePointArc((-94.1070315729, -31.392272507), (-93.1995248699, -34.2648146936), (-90.8064321274, -36.0946163646))
            Line((-90.8064321274, -36.0946163646), (-80, -40))
            Line((-80, -40), (-75, -40))
            ThreePointArc((-75, -40), (-78.5355339059, -38.5355339059), (-80, -35))
            Line((-80, -35), (-80, 35))
        make_face()
        with Locations((-86.9296938181, -28.7965349853)):
            Circle(F0_R, mode=Mode.SUBTRACT)
        with BuildLine():
            ThreePointArc((-84.4281092286, -8.2794375271), (-85.0138956662, -9.6936510894), (-86.4281092286, -10.2794375271))
            Line((-86.4281092286, -10.2794375271), (-86.8817831874, -10.2794375271))
            ThreePointArc((-86.8817831874, -10.2794375271), (-88.2959967498, -9.6936510894), (-88.8817831874, -8.2794375271))
            Line((-88.8817831874, -8.2794375271), (-88.8817831874, -3.3358105042))
            ThreePointArc((-88.8817831874, -3.3358105042), (-90.6657359872, 0), (-88.8817831874, 3.3358105042))
            Line((-88.8817831874, 3.3358105042), (-88.8817831874, 8.2794375271))
            ThreePointArc((-88.8817831874, 8.2794375271), (-88.2959967498, 9.6936510894), (-86.8817831874, 10.2794375271))
            Line((-86.8817831874, 10.2794375271), (-86.4281092286, 10.2794375271))
            ThreePointArc((-86.4281092286, 10.2794375271), (-85.0138956662, 9.6936510894), (-84.4281092286, 8.2794375271))
            Line((-84.4281092286, 8.2794375271), (-84.4281092286, 3.3358105042))
            ThreePointArc((-84.4281092286, 3.3358105042), (-83.1181531938, 1.891435917), (-82.6441564288, 0))
            ThreePointArc((-82.6441564288, 0), (-83.1181531938, -1.891435917), (-84.4281092286, -3.3358105042))
            Line((-84.4281092286, -3.3358105042), (-84.4281092286, -8.2794375271))
        make_face(mode=Mode.SUBTRACT)
        with Locations((-86.951315403, 28.4305214882)):
            Circle(F0_R_2, mode=Mode.SUBTRACT)
    extrude(amount=F3_DEPTH)


solid = f1.part
